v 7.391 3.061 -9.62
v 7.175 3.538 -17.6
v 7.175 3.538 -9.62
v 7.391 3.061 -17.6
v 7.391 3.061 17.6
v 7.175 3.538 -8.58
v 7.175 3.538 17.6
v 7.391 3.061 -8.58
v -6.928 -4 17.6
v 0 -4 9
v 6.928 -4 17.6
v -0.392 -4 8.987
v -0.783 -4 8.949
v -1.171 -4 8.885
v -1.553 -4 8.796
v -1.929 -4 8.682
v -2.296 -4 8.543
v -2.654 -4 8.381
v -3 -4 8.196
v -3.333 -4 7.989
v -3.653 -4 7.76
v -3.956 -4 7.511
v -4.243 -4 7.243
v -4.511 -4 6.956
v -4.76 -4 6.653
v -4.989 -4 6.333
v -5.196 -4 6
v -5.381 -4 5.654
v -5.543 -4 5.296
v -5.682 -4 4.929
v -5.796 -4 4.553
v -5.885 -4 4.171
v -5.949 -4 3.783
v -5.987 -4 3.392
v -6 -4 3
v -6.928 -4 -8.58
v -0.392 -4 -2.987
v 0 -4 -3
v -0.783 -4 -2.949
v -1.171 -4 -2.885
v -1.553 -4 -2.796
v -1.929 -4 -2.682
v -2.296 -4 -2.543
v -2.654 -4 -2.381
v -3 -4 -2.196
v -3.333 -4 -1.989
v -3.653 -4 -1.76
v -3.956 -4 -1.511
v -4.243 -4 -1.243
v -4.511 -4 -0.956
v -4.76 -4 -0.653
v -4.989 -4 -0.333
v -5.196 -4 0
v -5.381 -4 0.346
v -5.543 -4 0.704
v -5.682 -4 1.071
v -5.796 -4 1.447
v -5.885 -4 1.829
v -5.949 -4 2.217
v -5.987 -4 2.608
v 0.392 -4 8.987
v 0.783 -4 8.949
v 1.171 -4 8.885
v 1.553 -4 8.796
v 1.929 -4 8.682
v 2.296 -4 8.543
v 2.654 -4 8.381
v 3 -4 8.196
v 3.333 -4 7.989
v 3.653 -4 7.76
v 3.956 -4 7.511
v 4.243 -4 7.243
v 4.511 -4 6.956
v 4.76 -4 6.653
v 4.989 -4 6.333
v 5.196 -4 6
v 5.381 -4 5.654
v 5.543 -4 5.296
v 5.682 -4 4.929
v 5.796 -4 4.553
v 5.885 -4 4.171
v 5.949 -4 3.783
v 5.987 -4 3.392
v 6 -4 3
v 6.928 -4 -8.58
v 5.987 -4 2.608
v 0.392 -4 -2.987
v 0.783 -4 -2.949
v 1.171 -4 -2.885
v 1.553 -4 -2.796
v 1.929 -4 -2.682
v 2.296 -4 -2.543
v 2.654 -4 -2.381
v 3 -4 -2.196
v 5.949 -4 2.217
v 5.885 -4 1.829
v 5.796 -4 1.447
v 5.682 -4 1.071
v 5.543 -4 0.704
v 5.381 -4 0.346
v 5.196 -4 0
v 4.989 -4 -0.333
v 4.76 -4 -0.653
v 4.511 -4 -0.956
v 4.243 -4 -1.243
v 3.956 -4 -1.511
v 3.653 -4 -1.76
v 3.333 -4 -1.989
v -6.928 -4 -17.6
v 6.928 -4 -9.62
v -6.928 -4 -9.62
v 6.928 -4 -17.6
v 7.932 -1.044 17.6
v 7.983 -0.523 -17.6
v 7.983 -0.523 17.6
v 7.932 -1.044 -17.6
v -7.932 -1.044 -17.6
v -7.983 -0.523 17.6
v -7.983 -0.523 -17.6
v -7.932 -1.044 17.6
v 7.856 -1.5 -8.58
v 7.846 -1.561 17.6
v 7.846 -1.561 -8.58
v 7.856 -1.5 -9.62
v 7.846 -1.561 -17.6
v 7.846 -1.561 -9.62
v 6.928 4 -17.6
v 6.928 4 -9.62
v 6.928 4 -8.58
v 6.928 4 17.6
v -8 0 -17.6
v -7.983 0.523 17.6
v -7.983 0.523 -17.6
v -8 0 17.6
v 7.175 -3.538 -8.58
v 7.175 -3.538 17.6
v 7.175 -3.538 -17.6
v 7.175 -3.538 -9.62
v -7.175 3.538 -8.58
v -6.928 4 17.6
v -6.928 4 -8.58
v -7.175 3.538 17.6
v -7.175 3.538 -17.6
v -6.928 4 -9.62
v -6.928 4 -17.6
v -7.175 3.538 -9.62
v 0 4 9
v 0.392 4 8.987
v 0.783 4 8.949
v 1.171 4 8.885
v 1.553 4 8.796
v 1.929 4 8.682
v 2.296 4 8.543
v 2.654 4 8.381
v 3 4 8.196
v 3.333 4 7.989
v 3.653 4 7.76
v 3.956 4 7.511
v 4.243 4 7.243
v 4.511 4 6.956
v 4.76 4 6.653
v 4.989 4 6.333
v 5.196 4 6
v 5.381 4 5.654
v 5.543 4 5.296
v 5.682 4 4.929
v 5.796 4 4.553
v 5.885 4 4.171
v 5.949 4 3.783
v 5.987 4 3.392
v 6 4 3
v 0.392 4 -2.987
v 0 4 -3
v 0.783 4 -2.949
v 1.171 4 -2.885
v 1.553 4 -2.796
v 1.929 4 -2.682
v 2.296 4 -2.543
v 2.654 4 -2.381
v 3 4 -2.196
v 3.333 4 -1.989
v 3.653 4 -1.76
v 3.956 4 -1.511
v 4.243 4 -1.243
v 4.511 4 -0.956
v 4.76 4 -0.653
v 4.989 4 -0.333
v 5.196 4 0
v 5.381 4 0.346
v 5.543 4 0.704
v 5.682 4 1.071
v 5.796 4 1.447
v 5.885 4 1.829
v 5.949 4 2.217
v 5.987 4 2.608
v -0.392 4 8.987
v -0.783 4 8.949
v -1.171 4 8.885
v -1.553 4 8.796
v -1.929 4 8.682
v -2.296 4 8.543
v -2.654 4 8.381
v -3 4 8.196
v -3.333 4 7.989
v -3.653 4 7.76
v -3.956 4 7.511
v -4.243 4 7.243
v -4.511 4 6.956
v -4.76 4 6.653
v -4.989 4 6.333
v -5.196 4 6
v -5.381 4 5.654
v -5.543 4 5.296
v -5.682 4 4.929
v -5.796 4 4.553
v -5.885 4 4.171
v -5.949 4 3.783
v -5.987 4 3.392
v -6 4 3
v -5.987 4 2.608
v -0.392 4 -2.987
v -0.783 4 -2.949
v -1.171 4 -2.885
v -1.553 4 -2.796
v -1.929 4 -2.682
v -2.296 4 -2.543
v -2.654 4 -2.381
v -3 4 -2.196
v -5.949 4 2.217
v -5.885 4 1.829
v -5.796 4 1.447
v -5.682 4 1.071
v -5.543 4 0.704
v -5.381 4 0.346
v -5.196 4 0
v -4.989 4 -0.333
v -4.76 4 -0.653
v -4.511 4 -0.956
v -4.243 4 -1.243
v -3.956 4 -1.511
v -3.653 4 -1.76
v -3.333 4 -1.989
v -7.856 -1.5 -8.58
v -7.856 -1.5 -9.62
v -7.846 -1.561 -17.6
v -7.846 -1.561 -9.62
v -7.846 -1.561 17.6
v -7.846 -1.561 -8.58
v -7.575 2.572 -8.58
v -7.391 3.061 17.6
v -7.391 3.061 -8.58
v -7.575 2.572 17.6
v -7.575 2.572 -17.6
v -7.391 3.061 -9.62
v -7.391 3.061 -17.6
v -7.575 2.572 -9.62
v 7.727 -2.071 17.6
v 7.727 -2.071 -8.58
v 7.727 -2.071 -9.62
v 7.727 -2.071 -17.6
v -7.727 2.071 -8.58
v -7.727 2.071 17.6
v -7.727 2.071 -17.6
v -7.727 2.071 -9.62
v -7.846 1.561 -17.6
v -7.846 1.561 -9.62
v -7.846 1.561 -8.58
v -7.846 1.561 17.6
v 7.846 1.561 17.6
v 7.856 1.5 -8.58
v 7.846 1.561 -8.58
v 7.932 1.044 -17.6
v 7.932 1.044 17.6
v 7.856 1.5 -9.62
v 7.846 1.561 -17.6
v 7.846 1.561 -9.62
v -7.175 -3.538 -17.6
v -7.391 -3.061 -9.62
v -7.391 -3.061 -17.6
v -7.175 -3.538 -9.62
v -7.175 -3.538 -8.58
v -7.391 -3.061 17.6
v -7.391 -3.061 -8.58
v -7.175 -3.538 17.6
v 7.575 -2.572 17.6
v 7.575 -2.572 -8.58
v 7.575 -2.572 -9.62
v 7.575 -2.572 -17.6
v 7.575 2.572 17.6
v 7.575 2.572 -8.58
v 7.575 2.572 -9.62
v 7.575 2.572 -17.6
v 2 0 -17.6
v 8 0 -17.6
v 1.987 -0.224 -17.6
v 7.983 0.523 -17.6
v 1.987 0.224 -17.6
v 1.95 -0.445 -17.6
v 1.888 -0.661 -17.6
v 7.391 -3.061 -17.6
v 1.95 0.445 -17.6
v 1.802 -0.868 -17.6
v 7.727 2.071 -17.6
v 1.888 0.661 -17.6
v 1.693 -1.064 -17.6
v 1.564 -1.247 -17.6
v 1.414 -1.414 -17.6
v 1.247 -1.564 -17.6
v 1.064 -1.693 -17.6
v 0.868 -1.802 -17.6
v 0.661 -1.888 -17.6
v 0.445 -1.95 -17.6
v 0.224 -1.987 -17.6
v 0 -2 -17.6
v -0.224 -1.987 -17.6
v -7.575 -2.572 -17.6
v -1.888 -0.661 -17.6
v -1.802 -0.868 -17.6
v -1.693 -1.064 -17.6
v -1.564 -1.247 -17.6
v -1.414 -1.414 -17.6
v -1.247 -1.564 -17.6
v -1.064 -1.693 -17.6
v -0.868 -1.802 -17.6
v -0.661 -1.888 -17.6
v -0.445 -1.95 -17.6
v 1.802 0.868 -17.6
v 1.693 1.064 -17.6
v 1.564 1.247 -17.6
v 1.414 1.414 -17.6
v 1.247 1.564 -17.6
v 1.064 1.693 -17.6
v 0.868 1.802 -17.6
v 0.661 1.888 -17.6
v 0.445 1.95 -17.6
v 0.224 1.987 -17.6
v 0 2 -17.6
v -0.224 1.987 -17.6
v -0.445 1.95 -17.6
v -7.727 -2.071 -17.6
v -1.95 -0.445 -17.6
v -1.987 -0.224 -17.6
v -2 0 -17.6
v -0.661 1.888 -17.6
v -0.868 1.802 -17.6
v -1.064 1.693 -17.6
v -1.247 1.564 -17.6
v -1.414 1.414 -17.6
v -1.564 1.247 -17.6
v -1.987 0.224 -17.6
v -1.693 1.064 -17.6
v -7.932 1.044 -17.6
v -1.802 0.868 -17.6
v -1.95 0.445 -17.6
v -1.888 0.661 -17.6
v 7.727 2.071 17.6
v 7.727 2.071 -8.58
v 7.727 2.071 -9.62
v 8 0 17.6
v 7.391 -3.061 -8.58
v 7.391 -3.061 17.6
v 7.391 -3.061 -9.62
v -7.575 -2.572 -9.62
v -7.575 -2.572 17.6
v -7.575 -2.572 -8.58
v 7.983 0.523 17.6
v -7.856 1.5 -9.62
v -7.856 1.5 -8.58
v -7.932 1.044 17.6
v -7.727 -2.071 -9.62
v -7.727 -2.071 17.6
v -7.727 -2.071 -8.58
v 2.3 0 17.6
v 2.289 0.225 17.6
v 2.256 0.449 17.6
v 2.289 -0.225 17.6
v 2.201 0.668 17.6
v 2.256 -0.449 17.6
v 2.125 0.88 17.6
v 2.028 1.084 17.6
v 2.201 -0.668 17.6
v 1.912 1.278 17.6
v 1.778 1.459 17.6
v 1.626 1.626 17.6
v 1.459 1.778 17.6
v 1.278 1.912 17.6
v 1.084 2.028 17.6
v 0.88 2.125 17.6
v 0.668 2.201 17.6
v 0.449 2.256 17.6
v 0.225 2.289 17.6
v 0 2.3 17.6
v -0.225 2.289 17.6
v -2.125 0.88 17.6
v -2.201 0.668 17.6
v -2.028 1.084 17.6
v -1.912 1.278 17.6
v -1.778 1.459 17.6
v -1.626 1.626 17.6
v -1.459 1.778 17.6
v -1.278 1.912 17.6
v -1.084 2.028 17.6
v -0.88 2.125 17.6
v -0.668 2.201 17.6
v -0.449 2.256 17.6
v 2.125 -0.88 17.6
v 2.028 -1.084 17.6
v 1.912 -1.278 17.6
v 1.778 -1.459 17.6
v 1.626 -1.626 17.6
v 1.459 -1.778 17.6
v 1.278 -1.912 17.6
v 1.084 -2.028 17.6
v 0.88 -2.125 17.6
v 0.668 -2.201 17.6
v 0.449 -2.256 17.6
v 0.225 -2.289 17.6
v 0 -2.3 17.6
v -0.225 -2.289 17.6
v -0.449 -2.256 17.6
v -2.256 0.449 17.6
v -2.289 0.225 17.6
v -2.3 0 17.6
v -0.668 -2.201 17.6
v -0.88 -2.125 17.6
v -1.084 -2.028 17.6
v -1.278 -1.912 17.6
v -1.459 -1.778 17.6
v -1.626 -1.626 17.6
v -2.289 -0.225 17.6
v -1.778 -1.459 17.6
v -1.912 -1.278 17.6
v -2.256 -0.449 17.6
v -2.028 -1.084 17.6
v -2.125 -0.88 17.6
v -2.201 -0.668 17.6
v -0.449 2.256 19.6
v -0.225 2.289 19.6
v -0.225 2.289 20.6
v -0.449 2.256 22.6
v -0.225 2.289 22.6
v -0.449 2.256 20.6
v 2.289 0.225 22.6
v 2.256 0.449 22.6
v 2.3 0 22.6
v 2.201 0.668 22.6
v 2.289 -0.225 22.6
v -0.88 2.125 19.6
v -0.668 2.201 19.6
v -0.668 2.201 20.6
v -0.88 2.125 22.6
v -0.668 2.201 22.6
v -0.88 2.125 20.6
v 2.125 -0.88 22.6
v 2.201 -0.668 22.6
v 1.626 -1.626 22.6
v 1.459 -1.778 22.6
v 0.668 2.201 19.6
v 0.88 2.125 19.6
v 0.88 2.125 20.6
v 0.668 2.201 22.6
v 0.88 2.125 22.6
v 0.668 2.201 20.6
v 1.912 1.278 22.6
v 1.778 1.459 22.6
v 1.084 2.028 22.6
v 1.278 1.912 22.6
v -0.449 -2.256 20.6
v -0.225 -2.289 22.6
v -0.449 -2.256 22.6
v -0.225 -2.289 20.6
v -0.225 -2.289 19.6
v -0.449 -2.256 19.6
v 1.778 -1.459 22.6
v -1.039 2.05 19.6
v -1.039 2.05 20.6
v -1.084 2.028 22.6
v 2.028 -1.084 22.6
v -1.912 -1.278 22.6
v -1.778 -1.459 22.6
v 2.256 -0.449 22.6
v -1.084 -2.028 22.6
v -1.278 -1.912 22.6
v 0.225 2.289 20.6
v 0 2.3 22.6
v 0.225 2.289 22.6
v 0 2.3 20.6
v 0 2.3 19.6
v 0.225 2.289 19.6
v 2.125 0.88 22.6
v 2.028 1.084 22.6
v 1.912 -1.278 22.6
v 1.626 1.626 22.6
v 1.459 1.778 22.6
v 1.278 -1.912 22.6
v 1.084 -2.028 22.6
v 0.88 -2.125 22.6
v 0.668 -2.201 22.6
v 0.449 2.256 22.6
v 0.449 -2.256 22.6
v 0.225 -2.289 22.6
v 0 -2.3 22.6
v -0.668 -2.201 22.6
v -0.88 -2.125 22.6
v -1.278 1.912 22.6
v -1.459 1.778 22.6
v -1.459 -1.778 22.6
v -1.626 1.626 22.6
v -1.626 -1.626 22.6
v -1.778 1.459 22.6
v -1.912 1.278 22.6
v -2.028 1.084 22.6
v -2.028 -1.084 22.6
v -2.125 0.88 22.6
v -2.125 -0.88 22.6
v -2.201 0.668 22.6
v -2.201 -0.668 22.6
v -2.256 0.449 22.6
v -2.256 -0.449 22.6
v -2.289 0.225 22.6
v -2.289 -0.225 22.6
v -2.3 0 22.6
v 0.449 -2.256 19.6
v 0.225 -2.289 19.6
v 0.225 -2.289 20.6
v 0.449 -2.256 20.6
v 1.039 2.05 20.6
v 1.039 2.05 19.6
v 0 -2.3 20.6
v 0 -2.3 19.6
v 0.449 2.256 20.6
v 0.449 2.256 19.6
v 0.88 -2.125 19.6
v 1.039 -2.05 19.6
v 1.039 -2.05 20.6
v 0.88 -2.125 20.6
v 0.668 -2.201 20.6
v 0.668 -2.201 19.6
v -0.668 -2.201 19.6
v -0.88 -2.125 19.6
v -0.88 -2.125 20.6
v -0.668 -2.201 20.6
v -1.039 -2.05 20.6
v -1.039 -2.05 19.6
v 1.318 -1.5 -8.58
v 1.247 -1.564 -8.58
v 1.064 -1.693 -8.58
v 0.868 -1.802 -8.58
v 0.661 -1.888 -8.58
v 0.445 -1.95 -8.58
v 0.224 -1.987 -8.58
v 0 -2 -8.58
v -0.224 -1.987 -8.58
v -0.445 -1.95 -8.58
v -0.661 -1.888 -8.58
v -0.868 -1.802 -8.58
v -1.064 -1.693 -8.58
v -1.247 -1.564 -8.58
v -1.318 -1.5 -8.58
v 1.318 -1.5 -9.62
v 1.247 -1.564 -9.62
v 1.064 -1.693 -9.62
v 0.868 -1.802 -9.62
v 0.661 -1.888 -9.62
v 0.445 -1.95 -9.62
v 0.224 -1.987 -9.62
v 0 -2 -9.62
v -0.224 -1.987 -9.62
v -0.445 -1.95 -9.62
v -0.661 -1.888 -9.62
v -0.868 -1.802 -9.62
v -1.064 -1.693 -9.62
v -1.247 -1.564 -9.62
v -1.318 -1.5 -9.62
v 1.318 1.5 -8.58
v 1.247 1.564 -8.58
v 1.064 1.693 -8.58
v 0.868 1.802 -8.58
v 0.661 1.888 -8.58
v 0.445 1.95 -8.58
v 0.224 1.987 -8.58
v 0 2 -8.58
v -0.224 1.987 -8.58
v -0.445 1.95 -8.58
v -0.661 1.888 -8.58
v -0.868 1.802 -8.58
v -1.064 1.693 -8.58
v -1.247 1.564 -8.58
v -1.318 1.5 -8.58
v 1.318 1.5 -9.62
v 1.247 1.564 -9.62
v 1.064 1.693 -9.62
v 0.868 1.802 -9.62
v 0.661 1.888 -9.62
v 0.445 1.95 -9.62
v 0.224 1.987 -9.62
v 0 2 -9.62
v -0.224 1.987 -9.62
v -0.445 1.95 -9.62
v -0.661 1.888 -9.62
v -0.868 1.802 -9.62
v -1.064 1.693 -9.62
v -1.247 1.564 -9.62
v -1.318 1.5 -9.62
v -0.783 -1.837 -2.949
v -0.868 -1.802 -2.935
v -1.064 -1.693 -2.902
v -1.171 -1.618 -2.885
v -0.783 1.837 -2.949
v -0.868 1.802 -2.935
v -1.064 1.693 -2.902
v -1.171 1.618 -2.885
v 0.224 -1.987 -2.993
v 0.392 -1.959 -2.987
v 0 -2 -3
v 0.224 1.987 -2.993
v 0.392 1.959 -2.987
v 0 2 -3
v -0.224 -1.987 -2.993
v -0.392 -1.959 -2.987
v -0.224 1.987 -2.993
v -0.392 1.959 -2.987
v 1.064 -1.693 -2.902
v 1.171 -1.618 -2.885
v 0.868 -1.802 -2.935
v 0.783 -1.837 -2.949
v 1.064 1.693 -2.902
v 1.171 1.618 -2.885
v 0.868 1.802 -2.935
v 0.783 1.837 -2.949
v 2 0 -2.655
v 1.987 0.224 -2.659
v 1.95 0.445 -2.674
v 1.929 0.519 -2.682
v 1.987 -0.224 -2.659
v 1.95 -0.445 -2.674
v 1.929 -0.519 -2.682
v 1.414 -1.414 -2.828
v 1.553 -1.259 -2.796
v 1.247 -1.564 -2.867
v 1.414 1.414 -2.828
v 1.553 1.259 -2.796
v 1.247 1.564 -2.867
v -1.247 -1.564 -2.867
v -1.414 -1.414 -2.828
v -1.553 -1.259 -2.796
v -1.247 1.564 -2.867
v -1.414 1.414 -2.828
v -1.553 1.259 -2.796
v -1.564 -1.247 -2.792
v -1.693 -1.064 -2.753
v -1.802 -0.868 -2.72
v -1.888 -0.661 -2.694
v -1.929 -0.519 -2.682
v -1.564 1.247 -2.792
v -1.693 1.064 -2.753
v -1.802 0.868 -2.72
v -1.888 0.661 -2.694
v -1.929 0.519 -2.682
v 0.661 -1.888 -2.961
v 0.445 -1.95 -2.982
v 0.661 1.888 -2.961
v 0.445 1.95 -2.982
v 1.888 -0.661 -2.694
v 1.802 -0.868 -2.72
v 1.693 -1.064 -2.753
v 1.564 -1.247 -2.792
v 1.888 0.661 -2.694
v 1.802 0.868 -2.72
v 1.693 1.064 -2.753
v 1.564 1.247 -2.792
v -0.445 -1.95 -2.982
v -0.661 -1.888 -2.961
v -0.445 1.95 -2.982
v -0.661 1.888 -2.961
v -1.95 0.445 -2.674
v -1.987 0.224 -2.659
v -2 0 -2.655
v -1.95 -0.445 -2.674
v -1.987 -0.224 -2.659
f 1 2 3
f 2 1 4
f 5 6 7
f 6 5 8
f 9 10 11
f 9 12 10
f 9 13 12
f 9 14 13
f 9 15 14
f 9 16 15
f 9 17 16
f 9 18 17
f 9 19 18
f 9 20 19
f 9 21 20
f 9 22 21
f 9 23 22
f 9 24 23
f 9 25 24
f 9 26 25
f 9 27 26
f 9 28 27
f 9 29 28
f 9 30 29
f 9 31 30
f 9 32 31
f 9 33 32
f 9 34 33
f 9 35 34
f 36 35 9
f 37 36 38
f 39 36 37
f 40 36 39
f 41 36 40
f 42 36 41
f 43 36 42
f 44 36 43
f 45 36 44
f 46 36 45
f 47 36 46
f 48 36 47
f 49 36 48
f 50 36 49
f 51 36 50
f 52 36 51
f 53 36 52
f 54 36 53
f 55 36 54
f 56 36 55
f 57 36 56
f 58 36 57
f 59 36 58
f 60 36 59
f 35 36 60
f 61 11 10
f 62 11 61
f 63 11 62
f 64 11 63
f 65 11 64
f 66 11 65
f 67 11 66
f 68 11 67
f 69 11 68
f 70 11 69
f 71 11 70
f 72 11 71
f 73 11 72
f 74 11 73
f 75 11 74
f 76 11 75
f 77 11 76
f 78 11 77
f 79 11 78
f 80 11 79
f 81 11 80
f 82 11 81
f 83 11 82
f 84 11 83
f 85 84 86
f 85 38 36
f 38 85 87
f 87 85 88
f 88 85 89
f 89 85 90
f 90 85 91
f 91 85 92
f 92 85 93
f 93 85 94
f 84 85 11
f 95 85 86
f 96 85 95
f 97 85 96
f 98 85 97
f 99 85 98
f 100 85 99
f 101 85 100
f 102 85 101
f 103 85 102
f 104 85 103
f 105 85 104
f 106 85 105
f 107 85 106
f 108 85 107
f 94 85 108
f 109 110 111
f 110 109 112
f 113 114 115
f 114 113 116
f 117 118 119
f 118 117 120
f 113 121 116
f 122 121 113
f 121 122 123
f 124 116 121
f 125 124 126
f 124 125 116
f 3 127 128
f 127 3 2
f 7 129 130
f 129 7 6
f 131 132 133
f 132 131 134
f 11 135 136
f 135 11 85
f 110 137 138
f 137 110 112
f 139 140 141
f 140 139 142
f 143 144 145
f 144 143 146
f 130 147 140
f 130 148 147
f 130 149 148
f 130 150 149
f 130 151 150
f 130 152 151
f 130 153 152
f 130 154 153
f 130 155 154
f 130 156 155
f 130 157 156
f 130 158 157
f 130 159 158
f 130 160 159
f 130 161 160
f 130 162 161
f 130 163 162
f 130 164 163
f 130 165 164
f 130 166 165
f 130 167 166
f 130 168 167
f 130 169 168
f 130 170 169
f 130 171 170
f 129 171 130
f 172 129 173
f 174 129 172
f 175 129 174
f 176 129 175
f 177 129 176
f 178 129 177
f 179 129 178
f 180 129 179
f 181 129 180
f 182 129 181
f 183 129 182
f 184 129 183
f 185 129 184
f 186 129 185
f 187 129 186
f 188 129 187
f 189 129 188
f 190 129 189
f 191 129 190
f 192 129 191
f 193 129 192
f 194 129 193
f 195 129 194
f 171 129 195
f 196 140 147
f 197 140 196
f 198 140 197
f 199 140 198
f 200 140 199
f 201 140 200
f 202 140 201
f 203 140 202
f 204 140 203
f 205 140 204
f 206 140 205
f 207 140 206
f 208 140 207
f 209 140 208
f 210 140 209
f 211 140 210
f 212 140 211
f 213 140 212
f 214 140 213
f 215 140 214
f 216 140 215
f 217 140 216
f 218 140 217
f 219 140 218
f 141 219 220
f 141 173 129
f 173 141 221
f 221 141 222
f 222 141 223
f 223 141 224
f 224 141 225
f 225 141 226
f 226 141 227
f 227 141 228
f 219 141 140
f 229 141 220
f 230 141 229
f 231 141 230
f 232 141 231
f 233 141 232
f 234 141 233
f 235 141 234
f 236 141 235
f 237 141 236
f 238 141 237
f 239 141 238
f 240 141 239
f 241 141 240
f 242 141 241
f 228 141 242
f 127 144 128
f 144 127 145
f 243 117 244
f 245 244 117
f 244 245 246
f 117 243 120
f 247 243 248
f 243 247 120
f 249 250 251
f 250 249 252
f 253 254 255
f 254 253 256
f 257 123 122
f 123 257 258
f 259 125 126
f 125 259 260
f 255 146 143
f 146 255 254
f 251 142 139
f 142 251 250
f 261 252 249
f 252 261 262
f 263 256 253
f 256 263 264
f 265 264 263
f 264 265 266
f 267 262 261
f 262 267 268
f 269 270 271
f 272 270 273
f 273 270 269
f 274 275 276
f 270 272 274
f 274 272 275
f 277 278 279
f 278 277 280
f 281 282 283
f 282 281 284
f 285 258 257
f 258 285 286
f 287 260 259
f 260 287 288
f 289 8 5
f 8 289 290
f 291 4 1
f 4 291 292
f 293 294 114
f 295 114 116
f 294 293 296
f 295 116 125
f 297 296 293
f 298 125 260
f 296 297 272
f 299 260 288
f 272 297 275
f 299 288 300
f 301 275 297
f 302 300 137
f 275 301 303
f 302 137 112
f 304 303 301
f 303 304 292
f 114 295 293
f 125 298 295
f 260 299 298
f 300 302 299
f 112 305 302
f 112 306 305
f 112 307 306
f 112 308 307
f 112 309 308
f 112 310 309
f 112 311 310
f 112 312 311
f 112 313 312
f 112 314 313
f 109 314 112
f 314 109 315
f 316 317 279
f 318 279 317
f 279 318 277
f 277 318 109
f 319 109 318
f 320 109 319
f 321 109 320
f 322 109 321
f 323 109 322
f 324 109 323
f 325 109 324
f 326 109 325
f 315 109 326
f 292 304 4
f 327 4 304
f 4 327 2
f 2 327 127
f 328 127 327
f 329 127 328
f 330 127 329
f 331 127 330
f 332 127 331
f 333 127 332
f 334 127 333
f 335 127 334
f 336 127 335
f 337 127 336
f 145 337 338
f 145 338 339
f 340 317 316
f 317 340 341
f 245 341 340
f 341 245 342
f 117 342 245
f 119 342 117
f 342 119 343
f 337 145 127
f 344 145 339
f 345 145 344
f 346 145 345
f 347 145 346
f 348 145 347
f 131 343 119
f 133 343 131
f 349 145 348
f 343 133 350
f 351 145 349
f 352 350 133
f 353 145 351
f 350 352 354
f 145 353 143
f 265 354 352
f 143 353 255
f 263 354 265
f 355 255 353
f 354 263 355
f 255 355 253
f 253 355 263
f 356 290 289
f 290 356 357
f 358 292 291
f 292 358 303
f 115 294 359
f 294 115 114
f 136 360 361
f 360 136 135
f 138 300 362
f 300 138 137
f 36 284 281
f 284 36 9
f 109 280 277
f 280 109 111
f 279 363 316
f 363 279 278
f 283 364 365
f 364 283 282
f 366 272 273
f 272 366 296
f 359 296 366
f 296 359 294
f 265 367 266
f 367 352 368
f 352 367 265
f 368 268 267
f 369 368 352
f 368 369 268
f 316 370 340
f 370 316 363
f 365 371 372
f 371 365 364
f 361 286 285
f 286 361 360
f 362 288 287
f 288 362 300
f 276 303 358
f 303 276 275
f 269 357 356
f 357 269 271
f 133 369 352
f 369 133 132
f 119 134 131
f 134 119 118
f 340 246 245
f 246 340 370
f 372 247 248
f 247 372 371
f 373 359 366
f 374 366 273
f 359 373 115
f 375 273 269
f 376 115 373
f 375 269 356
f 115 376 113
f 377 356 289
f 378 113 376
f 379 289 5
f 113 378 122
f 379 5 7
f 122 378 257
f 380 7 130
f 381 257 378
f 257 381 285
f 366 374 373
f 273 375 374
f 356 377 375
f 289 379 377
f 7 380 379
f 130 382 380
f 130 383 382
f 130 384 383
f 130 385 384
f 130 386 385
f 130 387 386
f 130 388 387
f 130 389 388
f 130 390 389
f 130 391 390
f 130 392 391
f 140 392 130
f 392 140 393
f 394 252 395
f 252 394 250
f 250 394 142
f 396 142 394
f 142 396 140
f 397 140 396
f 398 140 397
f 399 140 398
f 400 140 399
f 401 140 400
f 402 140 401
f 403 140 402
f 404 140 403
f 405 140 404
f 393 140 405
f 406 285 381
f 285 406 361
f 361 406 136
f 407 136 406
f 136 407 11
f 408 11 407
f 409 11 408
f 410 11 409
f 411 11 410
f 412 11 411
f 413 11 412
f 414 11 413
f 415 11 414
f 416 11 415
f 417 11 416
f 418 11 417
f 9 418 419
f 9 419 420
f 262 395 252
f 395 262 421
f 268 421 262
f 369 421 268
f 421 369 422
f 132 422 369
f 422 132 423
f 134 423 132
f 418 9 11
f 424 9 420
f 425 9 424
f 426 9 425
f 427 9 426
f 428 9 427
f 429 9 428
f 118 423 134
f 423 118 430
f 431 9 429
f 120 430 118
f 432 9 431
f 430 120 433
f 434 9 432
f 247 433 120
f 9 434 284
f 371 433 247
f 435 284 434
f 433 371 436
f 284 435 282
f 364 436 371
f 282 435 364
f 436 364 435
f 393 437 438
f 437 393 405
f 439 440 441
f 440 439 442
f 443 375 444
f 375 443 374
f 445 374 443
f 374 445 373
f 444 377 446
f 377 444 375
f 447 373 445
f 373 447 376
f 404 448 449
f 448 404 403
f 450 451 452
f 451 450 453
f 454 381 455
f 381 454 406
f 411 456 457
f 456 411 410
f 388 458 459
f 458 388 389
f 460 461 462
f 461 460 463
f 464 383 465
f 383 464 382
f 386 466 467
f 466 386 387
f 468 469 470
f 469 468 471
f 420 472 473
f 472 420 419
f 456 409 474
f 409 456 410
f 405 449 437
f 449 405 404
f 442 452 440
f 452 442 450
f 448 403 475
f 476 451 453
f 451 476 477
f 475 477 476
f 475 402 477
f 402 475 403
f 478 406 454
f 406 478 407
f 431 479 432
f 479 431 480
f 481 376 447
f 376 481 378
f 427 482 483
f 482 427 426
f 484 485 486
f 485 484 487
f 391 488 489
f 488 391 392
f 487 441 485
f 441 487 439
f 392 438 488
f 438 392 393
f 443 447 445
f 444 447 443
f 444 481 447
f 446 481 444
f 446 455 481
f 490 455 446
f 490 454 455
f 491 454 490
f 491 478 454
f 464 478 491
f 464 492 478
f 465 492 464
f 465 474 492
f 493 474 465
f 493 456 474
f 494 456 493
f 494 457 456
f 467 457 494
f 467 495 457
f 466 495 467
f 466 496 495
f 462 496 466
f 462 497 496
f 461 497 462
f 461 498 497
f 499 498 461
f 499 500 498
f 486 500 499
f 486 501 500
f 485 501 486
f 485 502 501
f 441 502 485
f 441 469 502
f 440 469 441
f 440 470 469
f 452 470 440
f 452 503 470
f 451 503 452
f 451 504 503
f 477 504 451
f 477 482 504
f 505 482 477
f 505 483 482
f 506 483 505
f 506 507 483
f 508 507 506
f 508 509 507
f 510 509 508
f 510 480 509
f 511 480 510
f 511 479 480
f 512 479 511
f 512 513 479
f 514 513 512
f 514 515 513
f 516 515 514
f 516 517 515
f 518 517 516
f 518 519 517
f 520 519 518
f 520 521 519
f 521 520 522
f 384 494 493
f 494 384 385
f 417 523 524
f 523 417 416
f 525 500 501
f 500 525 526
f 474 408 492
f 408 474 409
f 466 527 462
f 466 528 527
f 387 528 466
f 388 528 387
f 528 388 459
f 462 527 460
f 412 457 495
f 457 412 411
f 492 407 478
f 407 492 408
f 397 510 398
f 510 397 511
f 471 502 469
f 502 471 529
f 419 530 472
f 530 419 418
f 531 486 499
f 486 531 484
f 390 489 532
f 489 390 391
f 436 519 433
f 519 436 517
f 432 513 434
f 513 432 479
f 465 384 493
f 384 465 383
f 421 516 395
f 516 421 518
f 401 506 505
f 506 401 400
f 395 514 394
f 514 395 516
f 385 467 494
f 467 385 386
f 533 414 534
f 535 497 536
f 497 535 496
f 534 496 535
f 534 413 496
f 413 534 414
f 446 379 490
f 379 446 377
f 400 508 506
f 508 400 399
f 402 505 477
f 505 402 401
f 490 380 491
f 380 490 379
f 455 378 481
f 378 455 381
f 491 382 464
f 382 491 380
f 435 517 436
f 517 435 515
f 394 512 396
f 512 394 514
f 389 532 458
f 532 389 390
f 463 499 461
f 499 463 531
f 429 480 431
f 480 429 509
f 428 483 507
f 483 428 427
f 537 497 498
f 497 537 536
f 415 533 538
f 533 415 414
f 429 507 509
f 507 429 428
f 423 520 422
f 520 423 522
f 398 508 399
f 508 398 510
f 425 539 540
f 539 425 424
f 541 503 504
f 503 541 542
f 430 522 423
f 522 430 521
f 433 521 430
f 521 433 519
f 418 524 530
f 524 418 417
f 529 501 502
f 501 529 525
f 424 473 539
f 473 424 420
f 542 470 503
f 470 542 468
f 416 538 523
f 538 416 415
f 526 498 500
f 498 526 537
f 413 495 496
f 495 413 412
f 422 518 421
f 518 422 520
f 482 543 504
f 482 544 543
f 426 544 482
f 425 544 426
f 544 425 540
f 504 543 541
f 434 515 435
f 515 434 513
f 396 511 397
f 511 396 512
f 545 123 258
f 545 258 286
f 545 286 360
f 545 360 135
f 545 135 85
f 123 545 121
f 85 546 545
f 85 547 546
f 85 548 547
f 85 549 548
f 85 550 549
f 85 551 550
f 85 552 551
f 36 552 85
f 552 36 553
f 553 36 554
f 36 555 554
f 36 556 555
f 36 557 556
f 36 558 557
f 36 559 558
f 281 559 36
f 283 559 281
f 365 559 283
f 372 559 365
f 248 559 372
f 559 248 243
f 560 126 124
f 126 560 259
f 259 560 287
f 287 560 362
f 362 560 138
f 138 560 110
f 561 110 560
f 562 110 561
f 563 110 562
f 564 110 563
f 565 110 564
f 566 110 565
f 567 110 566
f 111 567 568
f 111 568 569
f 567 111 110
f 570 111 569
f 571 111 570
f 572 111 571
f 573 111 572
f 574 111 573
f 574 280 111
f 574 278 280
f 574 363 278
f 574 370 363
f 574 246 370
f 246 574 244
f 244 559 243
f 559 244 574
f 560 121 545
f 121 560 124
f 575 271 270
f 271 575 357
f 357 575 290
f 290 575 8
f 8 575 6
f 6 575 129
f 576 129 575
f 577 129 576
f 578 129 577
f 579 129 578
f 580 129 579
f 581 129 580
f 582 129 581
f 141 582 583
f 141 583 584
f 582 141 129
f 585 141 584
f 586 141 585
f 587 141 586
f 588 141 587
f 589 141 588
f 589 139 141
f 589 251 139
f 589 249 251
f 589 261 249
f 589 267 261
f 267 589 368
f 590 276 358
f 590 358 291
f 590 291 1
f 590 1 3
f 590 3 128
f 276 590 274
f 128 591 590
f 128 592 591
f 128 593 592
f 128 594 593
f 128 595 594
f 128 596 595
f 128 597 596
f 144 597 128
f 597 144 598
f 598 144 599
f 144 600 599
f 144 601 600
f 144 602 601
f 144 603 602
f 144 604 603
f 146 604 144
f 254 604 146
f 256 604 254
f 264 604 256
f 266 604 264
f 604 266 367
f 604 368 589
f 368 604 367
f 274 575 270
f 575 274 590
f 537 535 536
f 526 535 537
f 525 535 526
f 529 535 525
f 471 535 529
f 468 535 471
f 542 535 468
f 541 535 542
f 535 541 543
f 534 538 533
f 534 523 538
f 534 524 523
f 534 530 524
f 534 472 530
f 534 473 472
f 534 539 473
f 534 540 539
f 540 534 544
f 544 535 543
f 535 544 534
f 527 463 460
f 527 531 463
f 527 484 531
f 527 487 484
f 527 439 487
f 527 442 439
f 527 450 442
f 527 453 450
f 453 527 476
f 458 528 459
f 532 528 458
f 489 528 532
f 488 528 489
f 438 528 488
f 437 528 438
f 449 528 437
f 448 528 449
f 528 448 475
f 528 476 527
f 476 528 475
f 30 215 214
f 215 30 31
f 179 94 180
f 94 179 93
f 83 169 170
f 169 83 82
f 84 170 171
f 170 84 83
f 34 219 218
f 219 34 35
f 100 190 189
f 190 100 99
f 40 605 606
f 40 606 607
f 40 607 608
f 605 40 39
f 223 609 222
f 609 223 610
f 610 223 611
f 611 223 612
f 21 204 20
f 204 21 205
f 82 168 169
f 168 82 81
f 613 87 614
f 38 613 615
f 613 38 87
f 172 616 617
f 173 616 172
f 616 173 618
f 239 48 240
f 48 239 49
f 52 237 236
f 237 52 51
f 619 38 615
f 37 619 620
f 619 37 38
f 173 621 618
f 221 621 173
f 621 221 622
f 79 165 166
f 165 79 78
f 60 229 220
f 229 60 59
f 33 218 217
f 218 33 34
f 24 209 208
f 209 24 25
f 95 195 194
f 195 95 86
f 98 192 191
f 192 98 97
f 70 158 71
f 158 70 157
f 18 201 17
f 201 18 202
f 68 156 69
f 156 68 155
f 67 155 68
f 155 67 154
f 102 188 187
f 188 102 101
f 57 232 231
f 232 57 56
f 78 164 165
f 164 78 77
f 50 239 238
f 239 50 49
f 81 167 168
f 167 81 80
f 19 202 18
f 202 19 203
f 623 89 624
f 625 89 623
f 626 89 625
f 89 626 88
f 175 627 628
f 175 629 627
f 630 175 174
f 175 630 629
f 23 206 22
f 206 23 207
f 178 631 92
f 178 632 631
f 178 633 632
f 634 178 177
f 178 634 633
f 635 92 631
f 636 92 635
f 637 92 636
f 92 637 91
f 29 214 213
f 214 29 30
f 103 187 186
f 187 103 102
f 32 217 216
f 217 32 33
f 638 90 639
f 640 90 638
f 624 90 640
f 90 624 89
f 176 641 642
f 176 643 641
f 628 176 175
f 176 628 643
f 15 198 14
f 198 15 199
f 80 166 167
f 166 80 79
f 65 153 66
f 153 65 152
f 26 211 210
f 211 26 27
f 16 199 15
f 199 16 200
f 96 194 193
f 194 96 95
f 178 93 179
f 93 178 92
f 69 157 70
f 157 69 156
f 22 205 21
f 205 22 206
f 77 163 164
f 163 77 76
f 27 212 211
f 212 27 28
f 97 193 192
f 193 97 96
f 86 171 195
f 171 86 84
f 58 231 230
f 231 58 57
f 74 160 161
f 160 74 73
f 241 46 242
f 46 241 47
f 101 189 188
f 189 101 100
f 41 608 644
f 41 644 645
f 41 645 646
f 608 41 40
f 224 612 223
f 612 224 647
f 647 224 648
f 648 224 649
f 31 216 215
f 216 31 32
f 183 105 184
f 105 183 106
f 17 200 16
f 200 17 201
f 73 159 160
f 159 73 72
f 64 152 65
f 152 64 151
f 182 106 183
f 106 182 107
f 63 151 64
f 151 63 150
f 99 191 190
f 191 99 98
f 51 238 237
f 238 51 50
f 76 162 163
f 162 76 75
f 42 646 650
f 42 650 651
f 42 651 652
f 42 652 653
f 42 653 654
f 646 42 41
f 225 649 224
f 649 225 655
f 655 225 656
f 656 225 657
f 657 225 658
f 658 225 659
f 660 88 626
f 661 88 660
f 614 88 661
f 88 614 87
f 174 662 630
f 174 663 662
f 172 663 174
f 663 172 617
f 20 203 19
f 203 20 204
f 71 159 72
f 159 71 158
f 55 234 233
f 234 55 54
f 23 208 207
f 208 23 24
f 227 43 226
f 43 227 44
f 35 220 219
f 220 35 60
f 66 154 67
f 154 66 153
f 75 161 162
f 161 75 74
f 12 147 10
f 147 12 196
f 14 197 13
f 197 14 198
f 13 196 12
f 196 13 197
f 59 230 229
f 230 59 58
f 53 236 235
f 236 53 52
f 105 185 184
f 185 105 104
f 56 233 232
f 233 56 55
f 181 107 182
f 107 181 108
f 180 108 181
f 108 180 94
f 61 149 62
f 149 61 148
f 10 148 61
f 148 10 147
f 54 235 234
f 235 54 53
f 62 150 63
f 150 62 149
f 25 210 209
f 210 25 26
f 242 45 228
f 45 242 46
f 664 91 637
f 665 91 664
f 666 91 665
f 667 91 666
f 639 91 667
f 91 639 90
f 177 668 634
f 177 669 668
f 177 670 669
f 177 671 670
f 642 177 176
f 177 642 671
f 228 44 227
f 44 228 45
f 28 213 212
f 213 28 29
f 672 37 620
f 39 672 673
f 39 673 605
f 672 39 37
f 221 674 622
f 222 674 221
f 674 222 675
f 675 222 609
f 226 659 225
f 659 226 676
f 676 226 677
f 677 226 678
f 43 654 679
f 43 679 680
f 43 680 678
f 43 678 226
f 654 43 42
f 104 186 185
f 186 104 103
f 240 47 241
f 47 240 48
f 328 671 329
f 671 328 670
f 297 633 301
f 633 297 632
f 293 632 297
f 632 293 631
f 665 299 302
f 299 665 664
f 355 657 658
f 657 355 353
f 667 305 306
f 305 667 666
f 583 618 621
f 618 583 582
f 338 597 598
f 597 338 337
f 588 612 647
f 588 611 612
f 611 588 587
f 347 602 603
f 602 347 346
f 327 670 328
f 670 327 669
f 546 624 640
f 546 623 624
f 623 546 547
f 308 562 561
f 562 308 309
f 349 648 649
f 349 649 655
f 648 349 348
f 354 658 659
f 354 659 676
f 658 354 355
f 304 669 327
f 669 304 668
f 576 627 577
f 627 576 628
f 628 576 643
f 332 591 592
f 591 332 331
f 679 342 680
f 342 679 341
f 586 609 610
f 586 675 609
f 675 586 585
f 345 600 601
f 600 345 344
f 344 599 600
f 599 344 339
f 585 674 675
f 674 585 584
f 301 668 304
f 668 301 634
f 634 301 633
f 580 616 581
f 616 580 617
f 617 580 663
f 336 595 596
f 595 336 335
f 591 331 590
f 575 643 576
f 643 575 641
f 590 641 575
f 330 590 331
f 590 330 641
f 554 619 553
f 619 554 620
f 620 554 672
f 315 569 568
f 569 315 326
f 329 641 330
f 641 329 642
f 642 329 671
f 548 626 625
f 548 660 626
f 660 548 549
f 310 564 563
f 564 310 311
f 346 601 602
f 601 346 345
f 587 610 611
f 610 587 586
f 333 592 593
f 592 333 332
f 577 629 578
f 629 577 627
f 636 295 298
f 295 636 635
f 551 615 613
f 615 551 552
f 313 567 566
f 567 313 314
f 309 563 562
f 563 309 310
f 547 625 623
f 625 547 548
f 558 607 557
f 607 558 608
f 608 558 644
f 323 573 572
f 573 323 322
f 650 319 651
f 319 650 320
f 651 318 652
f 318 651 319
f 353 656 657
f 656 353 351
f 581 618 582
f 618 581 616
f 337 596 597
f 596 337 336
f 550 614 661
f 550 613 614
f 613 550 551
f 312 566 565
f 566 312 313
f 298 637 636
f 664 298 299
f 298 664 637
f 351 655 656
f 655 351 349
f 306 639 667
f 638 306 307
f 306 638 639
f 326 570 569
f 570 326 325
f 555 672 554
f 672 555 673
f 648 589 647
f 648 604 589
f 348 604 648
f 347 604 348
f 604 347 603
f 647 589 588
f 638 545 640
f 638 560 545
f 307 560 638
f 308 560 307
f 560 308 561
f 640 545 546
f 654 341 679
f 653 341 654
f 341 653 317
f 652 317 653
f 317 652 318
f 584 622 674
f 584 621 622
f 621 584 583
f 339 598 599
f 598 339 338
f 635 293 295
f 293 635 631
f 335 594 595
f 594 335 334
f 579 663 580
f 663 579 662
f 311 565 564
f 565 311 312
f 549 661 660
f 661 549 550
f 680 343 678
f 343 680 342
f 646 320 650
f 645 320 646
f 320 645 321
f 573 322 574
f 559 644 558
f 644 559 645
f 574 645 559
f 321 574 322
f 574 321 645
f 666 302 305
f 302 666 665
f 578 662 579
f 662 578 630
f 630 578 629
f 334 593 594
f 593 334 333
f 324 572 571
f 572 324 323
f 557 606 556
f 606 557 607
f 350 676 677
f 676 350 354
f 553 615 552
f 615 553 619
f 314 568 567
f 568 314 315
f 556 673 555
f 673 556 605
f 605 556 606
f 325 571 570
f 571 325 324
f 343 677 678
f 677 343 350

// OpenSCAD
// Part A7: block with transverse bore and top post.
// SPDX-License-Identifier: MIT
//
// Local origin convention:
// - XY origin is the body centerline.
// - Z origin is the body midplane, excluding the top post.
// - Assembly placement and animation should be applied outside this file.

module a7_body_2d(base_r = 8.0, trim_half = 4.0) {
    // Drawing-driven base profile:
    // start from R8 circle, trim with parallel cuts at y = +/-4.
    intersection() {
        circle(r = base_r, $fn = 96);
        square([2 * base_r, 2 * trim_half], center = true);
    }
}

module part_a7(
    w = 16.0,
    d = 8.0,
    body_h = 35.2,
    bore_d = 12.0,
    bore_center_z = 20.6,
    // Bottom blind vertical hole (diameter inferred from drawing).
    bottom_hole_d = 4.0,
    // Top feature: simple column (slot details deferred).
    top_post_d = 4.6,
    top_post_h = 5.0,
    top_post_slot_h = 1.0,
    top_post_slot_depth = 0.25,
    // Body groove around lower portion.
    groove_z = 8.0,
    groove_h = 1.0,
    groove_depth_wide = 2.5,
    base_r = 8.0,
    trim_half = 4.0
) {
    z_min = -body_h / 2;

    difference() {
        union() {
            // Main block.
            translate([0, 0, z_min])
                linear_extrude(height = body_h)
                    a7_body_2d(base_r = base_r, trim_half = trim_half);

            // Simple top column.
            translate([0, 0, z_min + body_h])
                cylinder(d = top_post_d, h = top_post_h, center = false, $fn = 64);
        }

        // Main transverse bore (Ø12), dimension-driven location.
        translate([0, 0, z_min + bore_center_z])
            rotate([90, 0, 0])
                cylinder(d = bore_d, h = d + 0.4, center = true, $fn = 96);

        // Bottom blind vertical hole up to side-bore centerline.
        translate([0, 0, z_min - 0.1])
            cylinder(d = bottom_hole_d, h = bore_center_z + 0.2, center = false, $fn = 56);

        // Side grooves only on the two wide faces (deeper), not wrapping around short ends.
        for (sy = [-1, 1])
            translate([0, sy * (trim_half - groove_depth_wide / 2), z_min + groove_z + groove_h / 2])
                cube([2 * (base_r + 0.4), groove_depth_wide, groove_h + 0.04], center = true);

        // Matching slot pair in the middle of the upper pin.
        // Opposing shallow cuts, centered at pin mid-height.
        for (sy = [-1, 1])
            translate([
                0,
                sy * (top_post_d / 2 - top_post_slot_depth / 2),
                z_min + body_h + top_post_h / 2
            ])
                cube([top_post_d + 0.4, top_post_slot_depth, top_post_slot_h], center = true);

    }
}


// ---- "main guard" ----
// Default to previewing when opened directly:
if (is_undef(__LIB_MODE__)) {
    part_a7();
}
